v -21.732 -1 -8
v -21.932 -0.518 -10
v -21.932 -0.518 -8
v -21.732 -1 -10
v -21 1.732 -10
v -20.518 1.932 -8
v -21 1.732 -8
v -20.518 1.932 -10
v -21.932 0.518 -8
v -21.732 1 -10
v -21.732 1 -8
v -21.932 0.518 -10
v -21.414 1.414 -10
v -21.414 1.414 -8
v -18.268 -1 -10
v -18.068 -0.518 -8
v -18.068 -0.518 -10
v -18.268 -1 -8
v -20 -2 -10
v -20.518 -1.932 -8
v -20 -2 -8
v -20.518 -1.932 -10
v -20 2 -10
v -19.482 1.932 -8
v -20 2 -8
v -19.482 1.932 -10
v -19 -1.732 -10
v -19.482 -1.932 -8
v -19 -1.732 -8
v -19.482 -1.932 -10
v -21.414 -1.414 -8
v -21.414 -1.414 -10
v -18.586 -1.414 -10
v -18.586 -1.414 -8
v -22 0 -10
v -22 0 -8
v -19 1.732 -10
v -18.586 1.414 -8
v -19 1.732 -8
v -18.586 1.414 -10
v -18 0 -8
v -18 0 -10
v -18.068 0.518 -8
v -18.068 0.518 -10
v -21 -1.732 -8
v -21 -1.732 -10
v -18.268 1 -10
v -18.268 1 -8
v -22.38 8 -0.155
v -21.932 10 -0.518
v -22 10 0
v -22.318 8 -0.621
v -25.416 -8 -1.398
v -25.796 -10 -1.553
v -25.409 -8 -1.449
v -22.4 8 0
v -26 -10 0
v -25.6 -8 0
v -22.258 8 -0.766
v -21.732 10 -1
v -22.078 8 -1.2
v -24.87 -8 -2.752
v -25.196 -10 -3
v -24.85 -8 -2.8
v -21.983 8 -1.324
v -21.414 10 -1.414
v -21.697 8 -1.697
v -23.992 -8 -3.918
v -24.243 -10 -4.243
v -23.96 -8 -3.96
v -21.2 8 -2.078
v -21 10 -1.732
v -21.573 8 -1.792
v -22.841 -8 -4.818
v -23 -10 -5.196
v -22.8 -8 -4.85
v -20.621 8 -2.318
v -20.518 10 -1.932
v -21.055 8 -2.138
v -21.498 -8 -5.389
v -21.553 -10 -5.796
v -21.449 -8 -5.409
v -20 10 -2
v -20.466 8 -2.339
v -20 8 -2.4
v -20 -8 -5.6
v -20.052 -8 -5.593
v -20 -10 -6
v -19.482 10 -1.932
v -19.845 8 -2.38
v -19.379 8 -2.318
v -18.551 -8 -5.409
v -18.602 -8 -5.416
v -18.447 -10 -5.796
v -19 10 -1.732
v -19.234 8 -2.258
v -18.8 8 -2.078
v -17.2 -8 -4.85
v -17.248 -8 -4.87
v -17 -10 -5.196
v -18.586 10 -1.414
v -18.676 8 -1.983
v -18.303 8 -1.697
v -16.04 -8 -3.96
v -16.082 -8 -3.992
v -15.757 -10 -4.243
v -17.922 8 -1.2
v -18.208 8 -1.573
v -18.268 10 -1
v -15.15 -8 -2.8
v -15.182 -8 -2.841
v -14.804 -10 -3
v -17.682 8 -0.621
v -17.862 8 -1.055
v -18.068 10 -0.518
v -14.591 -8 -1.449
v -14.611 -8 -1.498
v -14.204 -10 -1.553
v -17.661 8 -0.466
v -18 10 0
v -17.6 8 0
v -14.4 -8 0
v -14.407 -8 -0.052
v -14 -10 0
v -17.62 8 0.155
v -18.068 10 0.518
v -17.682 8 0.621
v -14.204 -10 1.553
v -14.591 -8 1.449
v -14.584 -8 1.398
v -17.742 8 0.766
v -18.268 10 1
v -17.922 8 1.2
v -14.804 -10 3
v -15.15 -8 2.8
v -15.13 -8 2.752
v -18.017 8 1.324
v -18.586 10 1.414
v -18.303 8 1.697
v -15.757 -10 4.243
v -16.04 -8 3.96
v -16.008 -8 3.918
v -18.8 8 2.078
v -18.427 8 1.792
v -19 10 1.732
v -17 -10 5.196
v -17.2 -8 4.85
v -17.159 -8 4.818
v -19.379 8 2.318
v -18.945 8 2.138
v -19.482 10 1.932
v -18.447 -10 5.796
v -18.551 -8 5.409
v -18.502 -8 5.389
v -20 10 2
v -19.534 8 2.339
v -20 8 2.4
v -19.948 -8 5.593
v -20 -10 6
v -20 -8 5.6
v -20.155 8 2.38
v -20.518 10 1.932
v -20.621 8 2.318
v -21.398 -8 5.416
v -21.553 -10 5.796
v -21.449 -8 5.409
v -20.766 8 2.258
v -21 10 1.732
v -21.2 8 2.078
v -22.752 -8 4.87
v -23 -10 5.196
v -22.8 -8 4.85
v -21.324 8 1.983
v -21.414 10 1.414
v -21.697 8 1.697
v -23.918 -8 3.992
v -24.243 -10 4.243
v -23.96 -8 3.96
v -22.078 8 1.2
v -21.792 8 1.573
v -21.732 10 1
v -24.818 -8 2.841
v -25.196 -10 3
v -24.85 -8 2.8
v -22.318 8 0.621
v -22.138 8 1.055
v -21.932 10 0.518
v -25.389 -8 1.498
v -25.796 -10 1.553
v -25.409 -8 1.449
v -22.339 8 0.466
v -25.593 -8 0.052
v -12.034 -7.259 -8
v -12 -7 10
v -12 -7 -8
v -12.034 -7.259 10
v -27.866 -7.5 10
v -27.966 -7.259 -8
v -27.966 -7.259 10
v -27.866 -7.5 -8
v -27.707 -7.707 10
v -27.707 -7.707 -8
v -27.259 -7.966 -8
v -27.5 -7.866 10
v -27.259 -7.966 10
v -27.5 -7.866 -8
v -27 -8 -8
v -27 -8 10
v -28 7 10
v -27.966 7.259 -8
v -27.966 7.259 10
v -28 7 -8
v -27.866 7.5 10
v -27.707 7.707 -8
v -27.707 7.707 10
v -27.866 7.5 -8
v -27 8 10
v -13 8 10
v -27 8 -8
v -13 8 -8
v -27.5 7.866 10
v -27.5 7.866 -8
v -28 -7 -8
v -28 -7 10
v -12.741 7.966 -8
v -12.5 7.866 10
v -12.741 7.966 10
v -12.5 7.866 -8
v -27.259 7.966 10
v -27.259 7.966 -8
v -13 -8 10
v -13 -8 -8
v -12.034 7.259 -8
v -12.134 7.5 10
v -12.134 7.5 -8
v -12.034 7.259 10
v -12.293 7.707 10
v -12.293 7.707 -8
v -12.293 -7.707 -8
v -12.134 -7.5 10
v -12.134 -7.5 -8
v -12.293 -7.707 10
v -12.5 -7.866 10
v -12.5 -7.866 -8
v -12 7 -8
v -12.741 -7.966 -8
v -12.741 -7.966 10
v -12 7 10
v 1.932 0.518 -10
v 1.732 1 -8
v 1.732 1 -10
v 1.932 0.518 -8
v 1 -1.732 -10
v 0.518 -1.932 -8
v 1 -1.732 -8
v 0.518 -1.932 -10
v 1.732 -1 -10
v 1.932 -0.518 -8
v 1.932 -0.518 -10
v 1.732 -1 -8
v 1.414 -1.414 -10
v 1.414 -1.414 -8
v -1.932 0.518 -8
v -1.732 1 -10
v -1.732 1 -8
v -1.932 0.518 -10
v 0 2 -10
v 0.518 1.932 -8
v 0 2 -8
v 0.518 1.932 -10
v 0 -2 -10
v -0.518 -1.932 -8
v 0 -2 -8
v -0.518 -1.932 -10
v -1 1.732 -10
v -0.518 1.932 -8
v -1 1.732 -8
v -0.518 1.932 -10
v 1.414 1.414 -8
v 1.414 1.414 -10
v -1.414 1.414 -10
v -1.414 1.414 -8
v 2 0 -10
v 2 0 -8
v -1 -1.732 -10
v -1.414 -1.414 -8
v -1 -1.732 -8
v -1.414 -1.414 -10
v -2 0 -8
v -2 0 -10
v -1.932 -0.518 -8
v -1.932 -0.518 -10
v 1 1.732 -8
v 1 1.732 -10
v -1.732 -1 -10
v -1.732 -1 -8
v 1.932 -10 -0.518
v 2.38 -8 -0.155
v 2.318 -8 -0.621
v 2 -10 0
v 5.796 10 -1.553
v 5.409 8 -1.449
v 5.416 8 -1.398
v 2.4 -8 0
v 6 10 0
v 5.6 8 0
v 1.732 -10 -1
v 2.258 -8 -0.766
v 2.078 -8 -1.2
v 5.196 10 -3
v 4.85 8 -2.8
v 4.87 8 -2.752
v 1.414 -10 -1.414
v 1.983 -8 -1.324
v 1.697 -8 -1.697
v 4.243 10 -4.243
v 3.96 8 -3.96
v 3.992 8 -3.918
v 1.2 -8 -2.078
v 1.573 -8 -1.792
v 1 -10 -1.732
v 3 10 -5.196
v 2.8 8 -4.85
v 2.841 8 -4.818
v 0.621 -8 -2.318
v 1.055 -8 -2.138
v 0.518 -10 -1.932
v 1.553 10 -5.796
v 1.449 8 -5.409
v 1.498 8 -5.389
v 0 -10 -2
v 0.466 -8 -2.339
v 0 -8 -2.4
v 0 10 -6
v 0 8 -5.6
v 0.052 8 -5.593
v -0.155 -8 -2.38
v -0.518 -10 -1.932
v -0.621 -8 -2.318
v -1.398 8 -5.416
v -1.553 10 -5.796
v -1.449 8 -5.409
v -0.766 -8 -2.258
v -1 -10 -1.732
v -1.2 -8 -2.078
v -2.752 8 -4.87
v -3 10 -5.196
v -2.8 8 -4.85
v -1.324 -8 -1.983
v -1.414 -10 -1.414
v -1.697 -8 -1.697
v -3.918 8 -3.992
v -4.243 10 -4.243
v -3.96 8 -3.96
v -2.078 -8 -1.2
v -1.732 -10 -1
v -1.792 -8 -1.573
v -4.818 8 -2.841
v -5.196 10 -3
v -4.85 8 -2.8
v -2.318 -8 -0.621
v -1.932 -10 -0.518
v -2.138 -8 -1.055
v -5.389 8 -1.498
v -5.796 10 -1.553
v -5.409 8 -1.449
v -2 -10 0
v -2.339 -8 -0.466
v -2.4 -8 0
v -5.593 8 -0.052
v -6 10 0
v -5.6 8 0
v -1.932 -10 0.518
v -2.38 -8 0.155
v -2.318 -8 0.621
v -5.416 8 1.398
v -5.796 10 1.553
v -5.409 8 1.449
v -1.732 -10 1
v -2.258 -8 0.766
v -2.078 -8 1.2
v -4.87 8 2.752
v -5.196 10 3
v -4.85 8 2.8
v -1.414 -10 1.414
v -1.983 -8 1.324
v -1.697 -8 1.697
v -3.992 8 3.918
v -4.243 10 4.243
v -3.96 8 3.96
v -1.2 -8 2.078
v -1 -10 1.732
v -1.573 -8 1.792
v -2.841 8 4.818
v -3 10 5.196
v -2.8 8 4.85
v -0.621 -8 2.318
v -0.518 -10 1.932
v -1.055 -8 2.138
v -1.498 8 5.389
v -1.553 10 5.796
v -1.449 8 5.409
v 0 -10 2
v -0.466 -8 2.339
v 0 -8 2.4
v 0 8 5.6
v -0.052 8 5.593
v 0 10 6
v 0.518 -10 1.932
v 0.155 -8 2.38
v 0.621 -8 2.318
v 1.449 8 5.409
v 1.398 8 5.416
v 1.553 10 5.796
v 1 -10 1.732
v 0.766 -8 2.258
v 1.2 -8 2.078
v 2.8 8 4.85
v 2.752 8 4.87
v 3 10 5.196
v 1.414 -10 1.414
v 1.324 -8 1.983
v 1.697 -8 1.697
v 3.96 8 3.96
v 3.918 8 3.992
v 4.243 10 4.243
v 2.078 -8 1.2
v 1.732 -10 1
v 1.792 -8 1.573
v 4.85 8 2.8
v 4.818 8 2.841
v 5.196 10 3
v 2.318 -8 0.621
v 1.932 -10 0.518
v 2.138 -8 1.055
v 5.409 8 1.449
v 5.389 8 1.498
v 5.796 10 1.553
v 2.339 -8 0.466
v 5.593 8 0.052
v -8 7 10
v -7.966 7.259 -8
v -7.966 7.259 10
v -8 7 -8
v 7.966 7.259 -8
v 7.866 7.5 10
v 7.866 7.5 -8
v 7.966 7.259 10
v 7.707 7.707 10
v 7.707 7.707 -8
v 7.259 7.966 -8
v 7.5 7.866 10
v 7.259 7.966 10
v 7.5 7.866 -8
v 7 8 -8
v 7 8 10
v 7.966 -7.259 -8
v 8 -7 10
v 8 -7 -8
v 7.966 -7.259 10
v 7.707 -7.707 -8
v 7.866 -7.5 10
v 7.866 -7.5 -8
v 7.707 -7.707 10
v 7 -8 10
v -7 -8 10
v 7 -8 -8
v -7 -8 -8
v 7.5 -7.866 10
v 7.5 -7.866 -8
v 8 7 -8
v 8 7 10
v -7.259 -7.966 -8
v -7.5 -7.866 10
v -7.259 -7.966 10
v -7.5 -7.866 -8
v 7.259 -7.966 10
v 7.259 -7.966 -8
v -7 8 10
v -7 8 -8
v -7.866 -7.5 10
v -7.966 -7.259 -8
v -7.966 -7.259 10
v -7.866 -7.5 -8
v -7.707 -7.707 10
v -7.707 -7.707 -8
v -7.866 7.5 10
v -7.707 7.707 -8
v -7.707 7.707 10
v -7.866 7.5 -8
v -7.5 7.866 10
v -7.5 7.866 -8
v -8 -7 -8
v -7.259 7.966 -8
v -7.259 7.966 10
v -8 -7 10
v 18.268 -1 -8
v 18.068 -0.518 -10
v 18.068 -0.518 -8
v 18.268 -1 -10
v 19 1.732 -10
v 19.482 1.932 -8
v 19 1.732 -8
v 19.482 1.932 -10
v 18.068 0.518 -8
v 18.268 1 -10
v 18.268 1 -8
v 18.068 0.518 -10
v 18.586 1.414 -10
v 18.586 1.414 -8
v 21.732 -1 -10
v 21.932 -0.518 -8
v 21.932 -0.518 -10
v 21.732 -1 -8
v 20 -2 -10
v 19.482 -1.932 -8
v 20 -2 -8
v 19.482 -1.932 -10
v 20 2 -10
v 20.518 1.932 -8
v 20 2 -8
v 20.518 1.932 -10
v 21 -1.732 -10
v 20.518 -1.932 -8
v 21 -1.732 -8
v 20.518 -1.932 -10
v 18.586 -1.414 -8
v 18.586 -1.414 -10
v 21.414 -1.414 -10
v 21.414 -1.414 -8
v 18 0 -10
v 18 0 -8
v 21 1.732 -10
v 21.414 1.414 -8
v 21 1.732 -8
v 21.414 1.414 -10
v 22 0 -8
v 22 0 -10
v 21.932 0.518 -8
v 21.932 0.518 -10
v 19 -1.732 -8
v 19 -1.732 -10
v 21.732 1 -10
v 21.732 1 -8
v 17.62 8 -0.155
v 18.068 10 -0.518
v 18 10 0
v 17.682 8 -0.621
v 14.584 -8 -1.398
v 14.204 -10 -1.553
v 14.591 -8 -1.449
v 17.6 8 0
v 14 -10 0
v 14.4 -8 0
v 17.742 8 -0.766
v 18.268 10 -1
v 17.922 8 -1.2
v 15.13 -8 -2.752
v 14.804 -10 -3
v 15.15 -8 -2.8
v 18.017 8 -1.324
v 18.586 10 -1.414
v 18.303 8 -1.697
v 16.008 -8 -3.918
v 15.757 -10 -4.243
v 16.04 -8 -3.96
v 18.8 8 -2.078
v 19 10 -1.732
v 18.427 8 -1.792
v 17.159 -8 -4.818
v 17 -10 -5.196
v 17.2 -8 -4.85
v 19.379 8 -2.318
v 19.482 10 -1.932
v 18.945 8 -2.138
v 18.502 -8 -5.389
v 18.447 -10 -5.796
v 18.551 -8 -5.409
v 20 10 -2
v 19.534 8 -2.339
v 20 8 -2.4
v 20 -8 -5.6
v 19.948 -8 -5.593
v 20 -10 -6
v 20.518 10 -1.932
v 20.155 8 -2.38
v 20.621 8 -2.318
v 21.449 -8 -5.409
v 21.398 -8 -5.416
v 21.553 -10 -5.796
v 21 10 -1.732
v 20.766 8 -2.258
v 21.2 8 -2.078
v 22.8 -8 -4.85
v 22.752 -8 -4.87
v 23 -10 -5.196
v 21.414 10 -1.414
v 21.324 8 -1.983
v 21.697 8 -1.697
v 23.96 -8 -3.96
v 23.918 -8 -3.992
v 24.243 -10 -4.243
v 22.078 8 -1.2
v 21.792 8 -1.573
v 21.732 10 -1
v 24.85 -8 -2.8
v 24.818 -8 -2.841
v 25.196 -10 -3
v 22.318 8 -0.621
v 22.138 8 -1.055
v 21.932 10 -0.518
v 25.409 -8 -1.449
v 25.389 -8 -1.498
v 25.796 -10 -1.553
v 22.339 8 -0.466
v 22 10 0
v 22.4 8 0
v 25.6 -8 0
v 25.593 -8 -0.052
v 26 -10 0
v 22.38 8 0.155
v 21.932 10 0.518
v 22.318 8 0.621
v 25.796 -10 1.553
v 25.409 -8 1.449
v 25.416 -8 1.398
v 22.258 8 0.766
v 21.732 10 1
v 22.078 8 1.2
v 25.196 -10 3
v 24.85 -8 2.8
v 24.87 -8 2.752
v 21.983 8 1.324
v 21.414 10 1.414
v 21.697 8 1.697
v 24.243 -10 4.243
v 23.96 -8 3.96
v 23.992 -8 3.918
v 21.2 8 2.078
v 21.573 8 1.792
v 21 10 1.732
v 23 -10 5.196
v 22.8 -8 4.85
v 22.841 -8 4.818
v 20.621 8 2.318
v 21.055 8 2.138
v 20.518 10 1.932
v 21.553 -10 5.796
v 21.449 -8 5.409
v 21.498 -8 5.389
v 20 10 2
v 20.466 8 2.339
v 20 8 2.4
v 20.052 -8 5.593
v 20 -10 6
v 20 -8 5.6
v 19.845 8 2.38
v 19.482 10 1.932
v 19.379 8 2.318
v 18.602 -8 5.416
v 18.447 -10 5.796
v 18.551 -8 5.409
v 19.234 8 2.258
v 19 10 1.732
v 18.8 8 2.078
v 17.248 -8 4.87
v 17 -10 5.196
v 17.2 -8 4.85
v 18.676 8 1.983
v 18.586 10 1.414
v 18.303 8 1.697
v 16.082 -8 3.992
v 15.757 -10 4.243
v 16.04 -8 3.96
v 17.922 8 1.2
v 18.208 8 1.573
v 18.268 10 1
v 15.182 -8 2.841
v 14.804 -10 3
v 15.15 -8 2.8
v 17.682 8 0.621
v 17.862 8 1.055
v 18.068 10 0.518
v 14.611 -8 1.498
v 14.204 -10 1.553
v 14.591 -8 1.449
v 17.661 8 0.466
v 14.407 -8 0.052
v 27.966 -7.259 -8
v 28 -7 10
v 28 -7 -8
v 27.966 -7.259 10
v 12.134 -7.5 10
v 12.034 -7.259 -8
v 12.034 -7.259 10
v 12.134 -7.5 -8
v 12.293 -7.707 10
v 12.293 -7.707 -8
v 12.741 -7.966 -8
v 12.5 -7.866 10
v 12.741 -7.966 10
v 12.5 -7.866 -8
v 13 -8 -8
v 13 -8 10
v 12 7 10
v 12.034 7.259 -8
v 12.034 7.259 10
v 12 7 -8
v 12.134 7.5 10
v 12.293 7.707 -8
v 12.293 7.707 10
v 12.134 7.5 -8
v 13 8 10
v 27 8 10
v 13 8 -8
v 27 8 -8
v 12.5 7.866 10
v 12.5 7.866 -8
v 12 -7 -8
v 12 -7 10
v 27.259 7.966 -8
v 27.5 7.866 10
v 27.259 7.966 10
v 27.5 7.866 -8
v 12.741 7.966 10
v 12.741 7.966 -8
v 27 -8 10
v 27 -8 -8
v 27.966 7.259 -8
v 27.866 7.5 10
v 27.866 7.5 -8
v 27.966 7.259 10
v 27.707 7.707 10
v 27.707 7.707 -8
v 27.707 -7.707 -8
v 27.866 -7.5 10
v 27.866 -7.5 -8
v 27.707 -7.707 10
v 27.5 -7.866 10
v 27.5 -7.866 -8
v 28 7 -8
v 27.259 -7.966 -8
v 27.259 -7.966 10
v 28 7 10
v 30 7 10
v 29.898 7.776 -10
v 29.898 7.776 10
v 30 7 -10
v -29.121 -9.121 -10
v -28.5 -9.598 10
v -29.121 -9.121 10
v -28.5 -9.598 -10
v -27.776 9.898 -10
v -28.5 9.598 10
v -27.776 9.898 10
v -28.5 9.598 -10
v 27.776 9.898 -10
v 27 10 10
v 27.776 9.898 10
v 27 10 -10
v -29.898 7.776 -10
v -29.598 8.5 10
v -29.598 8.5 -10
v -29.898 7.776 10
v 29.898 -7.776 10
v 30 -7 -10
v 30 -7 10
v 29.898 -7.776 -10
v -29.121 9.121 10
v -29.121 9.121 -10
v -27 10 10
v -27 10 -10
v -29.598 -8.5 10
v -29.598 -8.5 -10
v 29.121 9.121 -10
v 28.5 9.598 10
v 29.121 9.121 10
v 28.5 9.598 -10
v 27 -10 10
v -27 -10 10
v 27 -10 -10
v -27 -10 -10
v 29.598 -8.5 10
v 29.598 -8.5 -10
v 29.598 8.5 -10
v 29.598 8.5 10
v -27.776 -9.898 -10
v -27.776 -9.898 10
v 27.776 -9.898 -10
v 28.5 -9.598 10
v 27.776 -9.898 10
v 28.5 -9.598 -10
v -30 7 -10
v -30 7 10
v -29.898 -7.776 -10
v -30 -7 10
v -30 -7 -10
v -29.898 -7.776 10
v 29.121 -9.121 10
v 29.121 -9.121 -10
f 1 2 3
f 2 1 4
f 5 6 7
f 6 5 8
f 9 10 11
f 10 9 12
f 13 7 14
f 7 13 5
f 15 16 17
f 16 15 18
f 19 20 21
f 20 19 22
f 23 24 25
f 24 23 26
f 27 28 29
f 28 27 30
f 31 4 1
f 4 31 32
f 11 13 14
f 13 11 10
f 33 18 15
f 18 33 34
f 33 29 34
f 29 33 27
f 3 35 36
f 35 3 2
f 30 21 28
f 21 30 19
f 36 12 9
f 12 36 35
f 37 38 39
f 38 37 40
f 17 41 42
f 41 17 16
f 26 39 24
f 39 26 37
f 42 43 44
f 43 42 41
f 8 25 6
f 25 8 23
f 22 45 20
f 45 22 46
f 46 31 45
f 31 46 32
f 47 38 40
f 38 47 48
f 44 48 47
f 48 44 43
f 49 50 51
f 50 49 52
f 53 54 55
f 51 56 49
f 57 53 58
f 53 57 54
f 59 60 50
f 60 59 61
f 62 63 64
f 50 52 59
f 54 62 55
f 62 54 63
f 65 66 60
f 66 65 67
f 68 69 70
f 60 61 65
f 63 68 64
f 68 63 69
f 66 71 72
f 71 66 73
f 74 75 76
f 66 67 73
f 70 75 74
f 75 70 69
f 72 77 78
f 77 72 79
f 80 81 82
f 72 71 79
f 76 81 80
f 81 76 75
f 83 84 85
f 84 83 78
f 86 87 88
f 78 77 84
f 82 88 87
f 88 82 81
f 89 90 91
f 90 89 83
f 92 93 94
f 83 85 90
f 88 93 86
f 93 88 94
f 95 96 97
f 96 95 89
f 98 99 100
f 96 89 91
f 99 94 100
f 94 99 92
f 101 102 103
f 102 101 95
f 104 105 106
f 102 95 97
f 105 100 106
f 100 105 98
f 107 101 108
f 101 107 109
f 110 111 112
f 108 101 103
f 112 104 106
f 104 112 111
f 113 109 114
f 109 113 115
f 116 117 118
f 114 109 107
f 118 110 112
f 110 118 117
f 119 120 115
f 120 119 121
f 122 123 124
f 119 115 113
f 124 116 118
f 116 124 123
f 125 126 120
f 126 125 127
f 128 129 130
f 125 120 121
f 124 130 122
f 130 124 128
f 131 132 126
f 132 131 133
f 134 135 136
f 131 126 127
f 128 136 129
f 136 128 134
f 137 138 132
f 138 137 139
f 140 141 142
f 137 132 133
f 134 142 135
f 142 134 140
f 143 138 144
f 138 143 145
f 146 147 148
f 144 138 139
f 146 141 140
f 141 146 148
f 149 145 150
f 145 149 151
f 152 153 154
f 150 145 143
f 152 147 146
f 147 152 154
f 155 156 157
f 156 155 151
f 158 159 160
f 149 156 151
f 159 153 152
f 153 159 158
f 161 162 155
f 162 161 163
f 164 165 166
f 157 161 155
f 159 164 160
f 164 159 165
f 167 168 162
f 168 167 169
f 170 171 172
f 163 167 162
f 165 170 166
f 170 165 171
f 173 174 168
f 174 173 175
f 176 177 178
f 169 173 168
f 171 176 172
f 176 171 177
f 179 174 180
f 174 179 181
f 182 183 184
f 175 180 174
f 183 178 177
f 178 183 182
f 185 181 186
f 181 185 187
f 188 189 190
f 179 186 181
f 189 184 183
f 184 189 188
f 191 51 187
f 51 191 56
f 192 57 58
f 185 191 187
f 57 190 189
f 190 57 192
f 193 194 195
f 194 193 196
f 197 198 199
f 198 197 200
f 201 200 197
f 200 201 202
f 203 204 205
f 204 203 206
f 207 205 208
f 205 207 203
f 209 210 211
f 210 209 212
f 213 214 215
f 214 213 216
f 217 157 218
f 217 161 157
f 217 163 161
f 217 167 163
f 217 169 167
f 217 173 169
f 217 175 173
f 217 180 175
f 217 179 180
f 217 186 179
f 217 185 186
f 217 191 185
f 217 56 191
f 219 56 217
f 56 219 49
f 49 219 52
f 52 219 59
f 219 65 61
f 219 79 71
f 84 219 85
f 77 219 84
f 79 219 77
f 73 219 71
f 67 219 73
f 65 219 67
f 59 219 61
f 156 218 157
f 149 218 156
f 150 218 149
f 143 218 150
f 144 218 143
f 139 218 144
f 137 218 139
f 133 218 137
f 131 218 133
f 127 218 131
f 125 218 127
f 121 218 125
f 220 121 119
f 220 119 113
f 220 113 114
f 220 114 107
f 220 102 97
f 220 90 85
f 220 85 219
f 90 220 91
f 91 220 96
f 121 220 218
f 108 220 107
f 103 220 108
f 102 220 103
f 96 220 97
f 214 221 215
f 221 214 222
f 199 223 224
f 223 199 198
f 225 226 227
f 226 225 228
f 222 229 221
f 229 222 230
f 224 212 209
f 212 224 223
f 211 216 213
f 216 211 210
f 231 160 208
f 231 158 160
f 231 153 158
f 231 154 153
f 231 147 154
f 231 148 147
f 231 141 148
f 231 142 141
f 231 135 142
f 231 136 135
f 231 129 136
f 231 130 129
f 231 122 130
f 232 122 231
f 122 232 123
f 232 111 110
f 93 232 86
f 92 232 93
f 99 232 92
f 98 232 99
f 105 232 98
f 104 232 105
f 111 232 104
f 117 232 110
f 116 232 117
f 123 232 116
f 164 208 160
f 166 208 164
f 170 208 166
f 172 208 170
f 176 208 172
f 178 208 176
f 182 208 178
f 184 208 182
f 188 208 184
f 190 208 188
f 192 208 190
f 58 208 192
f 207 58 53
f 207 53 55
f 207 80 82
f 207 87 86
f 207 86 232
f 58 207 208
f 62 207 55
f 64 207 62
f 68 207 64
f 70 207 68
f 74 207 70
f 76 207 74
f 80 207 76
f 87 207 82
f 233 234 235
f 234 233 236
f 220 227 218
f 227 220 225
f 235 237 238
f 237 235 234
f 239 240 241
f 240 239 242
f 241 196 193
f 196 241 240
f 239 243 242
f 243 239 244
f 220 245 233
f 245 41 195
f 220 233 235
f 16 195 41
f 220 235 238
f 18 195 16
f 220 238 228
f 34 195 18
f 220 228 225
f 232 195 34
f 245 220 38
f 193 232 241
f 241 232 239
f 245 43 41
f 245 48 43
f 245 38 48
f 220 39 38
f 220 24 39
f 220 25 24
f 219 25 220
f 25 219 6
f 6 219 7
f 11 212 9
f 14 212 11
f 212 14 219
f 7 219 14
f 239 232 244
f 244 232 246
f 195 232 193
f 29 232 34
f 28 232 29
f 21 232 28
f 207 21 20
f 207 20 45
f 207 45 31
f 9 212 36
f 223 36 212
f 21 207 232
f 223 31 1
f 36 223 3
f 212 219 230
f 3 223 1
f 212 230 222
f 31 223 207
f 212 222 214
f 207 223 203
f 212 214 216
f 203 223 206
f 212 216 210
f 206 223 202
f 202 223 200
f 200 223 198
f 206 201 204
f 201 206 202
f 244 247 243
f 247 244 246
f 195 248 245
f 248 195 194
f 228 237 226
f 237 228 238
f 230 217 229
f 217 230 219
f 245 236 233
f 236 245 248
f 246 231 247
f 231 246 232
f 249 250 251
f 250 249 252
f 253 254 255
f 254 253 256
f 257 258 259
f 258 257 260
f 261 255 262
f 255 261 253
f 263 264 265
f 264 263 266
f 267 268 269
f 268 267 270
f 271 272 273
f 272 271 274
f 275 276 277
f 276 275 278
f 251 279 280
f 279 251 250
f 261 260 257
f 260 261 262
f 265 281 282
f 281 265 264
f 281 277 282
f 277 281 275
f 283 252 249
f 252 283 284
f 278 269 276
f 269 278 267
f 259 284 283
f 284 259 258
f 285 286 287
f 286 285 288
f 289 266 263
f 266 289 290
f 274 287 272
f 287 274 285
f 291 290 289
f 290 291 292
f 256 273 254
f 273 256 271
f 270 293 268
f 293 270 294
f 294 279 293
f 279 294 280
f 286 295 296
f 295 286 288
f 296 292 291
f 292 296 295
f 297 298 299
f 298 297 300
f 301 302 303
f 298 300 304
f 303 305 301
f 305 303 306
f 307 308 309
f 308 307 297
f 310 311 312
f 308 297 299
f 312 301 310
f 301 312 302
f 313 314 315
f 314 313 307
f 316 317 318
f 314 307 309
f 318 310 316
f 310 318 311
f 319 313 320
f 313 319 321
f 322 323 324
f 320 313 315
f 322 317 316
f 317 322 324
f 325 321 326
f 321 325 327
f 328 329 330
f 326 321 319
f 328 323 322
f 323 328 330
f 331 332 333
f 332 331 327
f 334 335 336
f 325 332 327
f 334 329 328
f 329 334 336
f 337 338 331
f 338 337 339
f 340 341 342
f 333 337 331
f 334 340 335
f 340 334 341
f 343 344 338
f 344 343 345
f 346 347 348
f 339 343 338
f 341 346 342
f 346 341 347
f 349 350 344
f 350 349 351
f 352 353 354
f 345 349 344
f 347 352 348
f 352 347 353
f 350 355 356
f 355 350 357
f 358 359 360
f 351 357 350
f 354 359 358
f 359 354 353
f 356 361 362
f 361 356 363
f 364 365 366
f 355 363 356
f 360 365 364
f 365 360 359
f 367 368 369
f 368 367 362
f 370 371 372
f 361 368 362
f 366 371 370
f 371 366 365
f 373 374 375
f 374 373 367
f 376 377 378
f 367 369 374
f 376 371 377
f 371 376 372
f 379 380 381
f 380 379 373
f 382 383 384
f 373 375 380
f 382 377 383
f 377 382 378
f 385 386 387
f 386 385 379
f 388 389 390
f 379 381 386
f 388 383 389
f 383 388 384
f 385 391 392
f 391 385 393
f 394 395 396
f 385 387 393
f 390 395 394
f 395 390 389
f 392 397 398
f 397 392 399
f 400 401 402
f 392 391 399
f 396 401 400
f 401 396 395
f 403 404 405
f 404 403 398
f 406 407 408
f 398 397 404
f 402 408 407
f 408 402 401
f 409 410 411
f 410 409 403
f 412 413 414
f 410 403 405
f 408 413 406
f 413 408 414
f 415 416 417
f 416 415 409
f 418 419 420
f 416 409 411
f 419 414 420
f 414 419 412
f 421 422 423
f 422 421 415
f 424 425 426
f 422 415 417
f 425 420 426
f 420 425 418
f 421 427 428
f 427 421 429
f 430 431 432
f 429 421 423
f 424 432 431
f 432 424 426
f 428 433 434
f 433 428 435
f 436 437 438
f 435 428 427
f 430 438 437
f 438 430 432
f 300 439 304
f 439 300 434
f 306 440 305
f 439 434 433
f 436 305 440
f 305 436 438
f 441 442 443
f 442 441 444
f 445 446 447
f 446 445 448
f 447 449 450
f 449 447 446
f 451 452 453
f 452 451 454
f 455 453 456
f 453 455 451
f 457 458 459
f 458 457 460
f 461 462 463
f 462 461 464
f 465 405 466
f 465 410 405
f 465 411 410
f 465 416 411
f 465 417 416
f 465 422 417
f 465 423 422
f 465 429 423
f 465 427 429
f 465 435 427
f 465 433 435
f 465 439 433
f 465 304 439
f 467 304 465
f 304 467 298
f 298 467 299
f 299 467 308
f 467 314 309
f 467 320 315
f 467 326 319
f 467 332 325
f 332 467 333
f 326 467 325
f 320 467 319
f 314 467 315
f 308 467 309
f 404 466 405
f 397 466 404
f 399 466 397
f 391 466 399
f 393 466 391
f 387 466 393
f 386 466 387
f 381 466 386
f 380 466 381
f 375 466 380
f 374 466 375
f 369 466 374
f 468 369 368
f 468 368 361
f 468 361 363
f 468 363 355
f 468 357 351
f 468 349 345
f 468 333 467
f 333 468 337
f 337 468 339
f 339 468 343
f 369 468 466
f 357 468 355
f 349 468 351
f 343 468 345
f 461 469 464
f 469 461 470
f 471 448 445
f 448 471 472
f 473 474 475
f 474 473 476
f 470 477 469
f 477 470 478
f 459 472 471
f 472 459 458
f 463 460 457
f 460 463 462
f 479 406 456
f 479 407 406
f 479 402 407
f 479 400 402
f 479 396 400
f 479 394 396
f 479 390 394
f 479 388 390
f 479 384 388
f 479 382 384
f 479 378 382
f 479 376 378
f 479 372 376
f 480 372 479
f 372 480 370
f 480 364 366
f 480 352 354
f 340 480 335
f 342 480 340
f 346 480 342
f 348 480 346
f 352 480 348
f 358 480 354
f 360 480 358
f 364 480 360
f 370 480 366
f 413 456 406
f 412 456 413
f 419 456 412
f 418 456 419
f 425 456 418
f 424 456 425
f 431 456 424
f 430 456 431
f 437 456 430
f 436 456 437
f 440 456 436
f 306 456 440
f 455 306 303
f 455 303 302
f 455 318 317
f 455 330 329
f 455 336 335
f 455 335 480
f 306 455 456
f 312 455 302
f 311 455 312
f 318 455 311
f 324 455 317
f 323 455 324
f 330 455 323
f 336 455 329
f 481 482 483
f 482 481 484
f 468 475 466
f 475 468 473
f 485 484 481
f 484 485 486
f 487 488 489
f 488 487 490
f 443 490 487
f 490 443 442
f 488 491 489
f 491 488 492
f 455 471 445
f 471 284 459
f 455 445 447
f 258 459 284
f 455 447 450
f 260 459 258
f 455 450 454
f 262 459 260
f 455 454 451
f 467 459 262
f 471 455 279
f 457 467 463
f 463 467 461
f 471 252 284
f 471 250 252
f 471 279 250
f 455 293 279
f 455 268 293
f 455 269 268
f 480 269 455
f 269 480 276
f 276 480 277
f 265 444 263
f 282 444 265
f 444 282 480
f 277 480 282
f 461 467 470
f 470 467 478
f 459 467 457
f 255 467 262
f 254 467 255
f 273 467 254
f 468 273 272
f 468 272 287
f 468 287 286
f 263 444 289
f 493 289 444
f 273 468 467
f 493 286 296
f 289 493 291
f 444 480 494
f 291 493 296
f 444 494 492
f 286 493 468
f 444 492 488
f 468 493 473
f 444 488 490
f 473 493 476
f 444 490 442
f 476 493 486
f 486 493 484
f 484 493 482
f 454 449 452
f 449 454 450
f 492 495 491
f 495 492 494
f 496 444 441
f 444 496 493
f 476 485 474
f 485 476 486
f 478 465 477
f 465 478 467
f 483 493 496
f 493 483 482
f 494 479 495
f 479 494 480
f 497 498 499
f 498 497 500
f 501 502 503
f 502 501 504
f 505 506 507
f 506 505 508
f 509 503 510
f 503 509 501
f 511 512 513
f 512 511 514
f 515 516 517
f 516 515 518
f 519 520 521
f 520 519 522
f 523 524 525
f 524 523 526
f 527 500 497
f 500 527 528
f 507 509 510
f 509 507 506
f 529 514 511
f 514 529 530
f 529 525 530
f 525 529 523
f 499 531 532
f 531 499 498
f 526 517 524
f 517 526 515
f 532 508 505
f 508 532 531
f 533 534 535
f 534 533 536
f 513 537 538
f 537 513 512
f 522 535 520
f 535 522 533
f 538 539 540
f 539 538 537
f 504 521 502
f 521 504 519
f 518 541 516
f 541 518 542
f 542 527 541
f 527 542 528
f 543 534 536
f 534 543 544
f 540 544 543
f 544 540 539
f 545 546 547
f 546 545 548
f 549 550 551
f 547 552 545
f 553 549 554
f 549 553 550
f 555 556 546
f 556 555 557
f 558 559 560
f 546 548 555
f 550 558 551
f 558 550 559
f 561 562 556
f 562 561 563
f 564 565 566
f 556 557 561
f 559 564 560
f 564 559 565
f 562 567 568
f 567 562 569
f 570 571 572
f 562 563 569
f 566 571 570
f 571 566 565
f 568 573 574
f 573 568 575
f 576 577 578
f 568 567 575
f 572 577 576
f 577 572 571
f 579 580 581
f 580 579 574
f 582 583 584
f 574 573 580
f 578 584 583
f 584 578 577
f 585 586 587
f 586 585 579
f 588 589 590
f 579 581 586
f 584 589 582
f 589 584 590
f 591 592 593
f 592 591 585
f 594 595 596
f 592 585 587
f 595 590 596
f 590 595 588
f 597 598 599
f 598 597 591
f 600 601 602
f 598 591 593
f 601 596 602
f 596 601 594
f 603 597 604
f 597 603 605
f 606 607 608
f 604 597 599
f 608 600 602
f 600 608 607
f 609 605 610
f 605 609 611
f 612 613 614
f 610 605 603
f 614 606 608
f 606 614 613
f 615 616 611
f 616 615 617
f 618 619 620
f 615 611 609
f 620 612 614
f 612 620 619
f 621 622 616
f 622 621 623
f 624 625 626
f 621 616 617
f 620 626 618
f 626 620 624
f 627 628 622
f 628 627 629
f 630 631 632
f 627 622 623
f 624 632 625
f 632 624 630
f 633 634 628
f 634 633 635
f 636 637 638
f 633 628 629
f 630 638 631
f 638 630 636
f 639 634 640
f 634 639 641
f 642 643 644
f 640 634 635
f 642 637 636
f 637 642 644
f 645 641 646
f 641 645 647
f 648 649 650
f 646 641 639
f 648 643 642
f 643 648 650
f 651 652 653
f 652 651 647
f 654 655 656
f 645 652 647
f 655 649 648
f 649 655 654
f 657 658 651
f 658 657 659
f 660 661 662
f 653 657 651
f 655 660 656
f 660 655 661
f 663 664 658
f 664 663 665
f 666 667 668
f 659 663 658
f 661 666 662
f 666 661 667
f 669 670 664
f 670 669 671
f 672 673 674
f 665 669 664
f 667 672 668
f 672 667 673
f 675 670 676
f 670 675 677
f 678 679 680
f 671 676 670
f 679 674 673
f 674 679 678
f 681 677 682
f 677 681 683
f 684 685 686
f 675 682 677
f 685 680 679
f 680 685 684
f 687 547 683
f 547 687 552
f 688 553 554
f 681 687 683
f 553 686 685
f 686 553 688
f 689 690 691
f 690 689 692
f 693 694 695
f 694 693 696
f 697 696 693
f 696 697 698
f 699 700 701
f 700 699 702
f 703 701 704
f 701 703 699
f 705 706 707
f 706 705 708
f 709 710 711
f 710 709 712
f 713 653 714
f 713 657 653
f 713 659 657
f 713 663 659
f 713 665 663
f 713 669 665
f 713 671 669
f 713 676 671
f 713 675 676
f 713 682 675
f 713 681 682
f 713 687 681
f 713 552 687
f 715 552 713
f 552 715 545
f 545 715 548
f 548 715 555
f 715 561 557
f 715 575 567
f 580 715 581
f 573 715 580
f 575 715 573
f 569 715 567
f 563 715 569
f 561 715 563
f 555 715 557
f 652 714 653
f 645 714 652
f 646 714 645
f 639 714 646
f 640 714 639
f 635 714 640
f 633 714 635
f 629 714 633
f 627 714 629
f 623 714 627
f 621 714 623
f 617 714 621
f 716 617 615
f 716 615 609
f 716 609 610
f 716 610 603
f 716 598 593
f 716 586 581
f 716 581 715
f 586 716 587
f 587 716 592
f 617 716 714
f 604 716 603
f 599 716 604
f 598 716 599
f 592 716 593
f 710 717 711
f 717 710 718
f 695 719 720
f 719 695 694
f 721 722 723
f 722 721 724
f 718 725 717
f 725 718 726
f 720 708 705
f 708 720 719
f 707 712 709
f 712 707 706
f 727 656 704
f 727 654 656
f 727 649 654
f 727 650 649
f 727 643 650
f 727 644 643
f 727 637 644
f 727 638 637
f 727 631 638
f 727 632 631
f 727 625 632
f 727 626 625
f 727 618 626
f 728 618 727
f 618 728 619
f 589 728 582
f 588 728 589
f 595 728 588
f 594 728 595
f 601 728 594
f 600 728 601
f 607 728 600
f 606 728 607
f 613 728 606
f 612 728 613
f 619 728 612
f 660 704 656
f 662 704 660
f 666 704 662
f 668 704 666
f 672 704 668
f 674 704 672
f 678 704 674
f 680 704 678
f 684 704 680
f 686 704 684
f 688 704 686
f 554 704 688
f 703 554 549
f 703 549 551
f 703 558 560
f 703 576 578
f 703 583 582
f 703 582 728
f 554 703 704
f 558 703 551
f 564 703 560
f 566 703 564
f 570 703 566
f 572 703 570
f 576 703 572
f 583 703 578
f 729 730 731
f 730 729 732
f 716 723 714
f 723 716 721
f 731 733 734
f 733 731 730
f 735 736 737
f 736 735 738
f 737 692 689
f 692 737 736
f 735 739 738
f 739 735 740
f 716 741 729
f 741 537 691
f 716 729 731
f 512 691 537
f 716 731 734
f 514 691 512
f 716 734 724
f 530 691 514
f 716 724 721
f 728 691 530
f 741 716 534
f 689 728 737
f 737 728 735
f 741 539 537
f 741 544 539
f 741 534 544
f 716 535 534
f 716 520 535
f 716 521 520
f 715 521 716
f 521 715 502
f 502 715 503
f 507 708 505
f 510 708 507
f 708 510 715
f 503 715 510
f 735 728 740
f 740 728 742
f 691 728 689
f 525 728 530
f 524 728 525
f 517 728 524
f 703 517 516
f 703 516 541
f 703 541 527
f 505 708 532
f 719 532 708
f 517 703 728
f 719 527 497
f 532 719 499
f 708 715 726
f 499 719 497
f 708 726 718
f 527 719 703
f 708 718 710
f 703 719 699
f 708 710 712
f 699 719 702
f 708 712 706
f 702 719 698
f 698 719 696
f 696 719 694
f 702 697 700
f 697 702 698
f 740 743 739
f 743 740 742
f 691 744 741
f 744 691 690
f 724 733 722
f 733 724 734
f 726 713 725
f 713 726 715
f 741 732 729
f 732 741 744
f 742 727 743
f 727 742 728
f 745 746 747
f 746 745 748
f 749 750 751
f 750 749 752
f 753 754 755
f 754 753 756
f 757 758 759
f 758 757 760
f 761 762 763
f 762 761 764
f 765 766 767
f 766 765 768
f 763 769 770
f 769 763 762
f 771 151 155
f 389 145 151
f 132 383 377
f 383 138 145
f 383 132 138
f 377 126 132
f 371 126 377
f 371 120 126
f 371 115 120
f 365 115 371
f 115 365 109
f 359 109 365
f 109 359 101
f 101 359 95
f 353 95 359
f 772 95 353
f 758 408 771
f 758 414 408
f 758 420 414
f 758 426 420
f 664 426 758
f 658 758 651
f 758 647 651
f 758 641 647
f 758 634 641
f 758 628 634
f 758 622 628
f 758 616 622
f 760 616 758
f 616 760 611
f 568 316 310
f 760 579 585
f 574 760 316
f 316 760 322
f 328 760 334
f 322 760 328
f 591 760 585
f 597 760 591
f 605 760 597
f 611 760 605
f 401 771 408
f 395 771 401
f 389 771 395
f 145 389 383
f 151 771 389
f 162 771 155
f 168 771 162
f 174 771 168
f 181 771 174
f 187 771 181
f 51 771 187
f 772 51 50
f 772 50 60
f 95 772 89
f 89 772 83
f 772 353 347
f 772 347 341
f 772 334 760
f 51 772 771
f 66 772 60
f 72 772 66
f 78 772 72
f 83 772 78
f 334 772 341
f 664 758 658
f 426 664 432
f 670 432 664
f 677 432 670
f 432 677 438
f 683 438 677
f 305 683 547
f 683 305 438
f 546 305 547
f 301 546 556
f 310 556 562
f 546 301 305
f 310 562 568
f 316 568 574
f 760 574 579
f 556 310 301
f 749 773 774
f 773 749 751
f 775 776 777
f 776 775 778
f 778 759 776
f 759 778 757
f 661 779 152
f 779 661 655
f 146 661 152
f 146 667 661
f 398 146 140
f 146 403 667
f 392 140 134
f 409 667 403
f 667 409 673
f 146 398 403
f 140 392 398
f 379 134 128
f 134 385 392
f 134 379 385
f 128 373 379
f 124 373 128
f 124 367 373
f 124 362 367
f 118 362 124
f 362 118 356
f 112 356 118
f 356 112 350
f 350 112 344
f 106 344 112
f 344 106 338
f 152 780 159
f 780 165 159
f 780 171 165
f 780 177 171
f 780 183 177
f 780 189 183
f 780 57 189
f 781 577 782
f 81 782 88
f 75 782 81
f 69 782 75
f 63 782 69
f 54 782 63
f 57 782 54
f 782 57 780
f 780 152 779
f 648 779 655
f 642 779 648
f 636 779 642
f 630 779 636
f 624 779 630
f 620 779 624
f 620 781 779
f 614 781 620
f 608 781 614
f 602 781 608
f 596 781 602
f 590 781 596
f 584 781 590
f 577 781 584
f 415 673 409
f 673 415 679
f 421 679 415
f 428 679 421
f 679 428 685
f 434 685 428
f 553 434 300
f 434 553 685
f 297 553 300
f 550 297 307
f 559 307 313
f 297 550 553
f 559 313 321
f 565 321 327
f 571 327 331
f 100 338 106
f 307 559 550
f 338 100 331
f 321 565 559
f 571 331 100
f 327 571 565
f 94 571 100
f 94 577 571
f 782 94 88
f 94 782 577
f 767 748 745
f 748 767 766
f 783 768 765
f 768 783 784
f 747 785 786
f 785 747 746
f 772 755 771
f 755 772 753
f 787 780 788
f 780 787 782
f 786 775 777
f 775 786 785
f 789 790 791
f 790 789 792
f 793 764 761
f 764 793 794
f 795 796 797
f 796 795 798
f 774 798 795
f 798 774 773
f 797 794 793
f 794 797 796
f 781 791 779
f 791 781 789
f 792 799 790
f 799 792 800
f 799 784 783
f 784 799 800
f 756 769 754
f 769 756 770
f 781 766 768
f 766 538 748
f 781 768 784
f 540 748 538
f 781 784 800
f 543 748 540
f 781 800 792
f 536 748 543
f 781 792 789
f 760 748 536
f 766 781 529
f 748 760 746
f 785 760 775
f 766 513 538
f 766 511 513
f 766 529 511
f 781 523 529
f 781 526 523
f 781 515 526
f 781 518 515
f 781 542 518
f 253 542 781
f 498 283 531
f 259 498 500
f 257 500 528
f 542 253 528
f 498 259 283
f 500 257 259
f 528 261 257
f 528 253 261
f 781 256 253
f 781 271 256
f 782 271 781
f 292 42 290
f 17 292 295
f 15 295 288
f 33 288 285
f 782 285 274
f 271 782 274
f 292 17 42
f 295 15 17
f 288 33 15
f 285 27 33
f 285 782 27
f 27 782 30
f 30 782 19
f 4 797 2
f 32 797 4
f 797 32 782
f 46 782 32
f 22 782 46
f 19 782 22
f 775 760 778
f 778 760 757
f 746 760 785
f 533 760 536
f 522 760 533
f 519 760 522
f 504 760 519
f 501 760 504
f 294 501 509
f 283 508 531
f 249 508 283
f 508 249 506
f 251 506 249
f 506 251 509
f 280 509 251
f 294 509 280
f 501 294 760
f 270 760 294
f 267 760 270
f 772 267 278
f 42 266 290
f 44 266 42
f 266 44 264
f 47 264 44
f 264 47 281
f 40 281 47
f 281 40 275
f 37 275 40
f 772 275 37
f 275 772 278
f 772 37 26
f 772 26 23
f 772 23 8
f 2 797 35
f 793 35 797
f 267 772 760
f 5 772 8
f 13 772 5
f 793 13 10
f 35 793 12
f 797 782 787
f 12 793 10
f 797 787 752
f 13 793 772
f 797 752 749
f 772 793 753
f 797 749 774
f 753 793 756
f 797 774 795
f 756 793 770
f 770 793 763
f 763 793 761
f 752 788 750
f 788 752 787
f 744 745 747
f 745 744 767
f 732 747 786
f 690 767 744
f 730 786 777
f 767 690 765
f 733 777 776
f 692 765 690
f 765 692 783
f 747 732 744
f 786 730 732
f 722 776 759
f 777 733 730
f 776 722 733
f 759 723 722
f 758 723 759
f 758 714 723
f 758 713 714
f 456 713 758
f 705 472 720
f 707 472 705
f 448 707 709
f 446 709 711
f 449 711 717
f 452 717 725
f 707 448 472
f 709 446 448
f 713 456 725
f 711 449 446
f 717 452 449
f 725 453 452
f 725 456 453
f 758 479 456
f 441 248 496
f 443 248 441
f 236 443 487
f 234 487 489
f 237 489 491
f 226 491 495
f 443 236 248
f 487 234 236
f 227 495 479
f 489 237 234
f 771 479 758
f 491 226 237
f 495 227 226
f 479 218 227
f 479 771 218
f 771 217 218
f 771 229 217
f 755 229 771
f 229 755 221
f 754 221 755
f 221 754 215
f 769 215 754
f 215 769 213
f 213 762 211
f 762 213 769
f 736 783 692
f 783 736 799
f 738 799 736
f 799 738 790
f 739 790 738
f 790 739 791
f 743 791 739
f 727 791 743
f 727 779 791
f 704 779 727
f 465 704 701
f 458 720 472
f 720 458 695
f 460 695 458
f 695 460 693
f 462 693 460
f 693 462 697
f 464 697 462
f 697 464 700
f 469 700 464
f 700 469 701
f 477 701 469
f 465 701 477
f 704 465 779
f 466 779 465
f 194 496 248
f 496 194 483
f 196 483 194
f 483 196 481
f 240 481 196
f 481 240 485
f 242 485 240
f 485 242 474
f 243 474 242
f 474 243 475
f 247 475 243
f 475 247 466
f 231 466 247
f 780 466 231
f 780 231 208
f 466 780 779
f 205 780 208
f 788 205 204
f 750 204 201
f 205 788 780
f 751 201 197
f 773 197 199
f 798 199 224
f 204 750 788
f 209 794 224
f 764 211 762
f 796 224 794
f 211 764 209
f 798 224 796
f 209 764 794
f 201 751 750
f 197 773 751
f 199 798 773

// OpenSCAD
// file: ../lib/TOGMod1Constructors.scad
// TOGMod1Constructors-v1.6
// 
// Functions to construct objects understood by TOGMod1
// 
// v1.1:
// - Add togmod1_make_rounded_rect
// v1.2:
// - togmod1_make_rounded_rect can make ovals
// v1.3:
// - togmod1_circle_points, to just get the points of a circle
// - if pos parameter to circle function has a third element,
//   returned vertexes will include it as the z component;
// v1.3.1
// - Some assertions
// v1.4:
// - Refactor togmod1_rounded_rect_points and togmod1_circle_points
//   to use togmod1__make_nd_vector_adder for adapting to whatever
//   `pos` parameter is.
// v1.5:
// - togmod_rounded_rect_points will not simplify completely rounded sides
//   (where length of side is exactly twice the rounding radius)
//   unless simplify_rounded_sides=true
//   - This makes it more useful for polyhedron generation,
//     where radius varies, but number of points must remain constant.
// v1.6:
// - togmod1_make_rect makes a simple rectangle
// - togmod1_make_rounded_rect will defer to togmod1_make_rect when r=0

use <./TOGArrayLib1.scad>

function togmod1__make_nd_vector_adder(origin=[0,0]) =
	let(origin_is_zero = tal1_reduce(true, origin, function(prev,item) prev && item == 0))
	origin_is_zero ? (function(vec) len(vec) >= len(origin) ? vec : tal1_replace_at(origin, 0, vec)) :
	function(vec) [
		for(i=[0:1:max(len(origin),len(vec))-1]) (len(vec) > i ? vec[i] : 0) + (len(origin) > i ? origin[i] : 0),
	];

assert([1,2,3] == togmod1__make_nd_vector_adder()([1,2,3]));
echo(togmod1__make_nd_vector_adder([0,0,3])([1,2]));
assert([1,2,3] == togmod1__make_nd_vector_adder([0,0,3])([1,2]));


function togmod1_make_cuboid(size) =
	assert(is_list(size))
	assert(len(size) >= 3)
	assert(is_num(size[0]))
	assert(is_num(size[1]))
	assert(is_num(size[2]))
	["polyhedron-vf", [
		[-size[0]/2, -size[1]/2, -size[2]/2],
		[+size[0]/2, -size[1]/2, -size[2]/2],
		[-size[0]/2, +size[1]/2, -size[2]/2],
		[+size[0]/2, +size[1]/2, -size[2]/2],
		[-size[0]/2, -size[1]/2, +size[2]/2],
		[+size[0]/2, -size[1]/2, +size[2]/2],
		[-size[0]/2, +size[1]/2, +size[2]/2],
		[+size[0]/2, +size[1]/2, +size[2]/2]
	], [
		[0,1,3,2],[0,4,5,1],[4,6,7,5],[3,7,6,2],[1,5,7,3],[6,4,0,2]
	]];

function togmod1_make_polygon(verts) =
	["polygon-vp", verts, [[for( i=[0:1:len(verts)-1] ) i%len(verts)]]];

function togmod1_rounded_rect_points(size, r, pos=[0,0], simplify_rounded_sides=false) =
	assert(is_list(size))
	assert(len(size) >= 2)
	let(radii = is_list(r) ? r : is_num(r) ? [r,r] : assert(false, "rounded_rect r(adius) should be list<num> or num"))
	let(rx = radii[0])
	let(ry = radii[1])
	assert(is_num(rx))
	assert(is_num(ry))
	assert(size[0] >= 2*rx, str("size[0] must be >= 2*r[0]; size[0] = ",size[0],", 2*r[0] = ",2*rx))
	assert(size[1] >= 2*ry, str("size[1] must be >= 2*r[1]; size[1] = ",size[1],", 2*r[1] = ",2*ry))
	let(quarterfn=max($fn/4, 1))
	let(qfnx = simplify_rounded_sides && size[0] == 2*rx ? quarterfn-1 : quarterfn)
	let(qfny = simplify_rounded_sides && size[1] == 2*ry ? quarterfn-1 : quarterfn)
	let(finalizepos = togmod1__make_nd_vector_adder(pos))
[
	for(a=[0 : 1 : qfnx]) let(ang=      a*90/quarterfn) finalizepos([ size[0]/2-rx + rx*cos(ang),  size[1]/2-ry + ry*sin(ang)]),
	for(a=[0 : 1 : qfny]) let(ang= 90 + a*90/quarterfn) finalizepos([-size[0]/2+rx + rx*cos(ang),  size[1]/2-ry + ry*sin(ang)]),
	for(a=[0 : 1 : qfnx]) let(ang=180 + a*90/quarterfn) finalizepos([-size[0]/2+rx + rx*cos(ang), -size[1]/2+ry + ry*sin(ang)]),
	for(a=[0 : 1 : qfny]) let(ang=270 + a*90/quarterfn) finalizepos([ size[0]/2-rx + rx*cos(ang), -size[1]/2+ry + ry*sin(ang)]),
];

function togmod1_make_rect(size) =
	togmod1_make_polygon([
		[-size[0]/2, -size[1]/2],
		[+size[0]/2, -size[1]/2],
		[+size[0]/2, +size[1]/2],
		[-size[0]/2, +size[1]/2],
	]);

function togmod1_make_rounded_rect(size, r) =
	r == 0 ? togmod1_make_rect(size) :
	togmod1_make_polygon(togmod1_rounded_rect_points(size,r,simplify_rounded_sides=true));

function togmod1_circle_points(r, pos=[0,0], d=undef) =
	assert( !is_undef(r) || !is_undef(d) )
	assert(!is_undef(pos[0]))
	assert(!is_undef(pos[1]))
	let(finalizepos = togmod1__make_nd_vector_adder(pos))
	let(r_ = !is_undef(r) ? r : d/2)
	let(fn = max($fn, 6))
	[for(i=[0 : 1 : fn-1]) finalizepos([r_*cos(i*360/fn), r_*sin(i*360/fn)])];

function togmod1_make_circle(r, pos=[0,0], d=undef) =
	togmod1_make_polygon(togmod1_circle_points(r=r, pos=pos, d=d));

function togmod1_make_cylinder(d, zrange=[0,1], r=undef, pos=[0,0]) =
	assert( !is_undef(r) || !is_undef(d) )
	let( r_ = !is_undef(r) ? r : d/2 )
	// TODO: Make polyhedron directly
	["linear-extrude-zs", zrange, togmod1_make_circle(r=r_, pos=pos)];

function togmod1__is_range1d(range) = is_list(range) && len(range) == 2 && is_num(range[0]) && is_num(range[1]);

function togmod1_linear_extrude_z(range, shape) =
	assert(togmod1__is_range1d(range))
	["linear-extrude-zs", range, shape];
function togmod1_linear_extrude_x(range, shape) =
	assert(togmod1__is_range1d(range))
	["rotate", [90, 0, 90], togmod1_linear_extrude_z(range, shape)];
function togmod1_linear_extrude_y(range, shape) =
	assert(togmod1__is_range1d(range))
	["rotate", [90, 0, 180], togmod1_linear_extrude_z(range, shape)];
// file: ../lib/TOGArrayLib1.scad
// TOGArrayLib1.4
// 
// Functions for working with arrays.
// 
// v1.1:
// - tal1_reduce assert(is_list(items)) to prevent infinite recursion
//   when given undefined or other non-list values
// v1.1.1:
// - Fix tal1_uniq_remap_v2 to return "list-remap-result" as the
//   first element of the returned list
// v1.2:
// - Add tal1_replace_at function
// v1.3:
// - tal1_is_vec_of, tal1_is_vec_of_num
// v1.4:
// - tal1_assert_for_each, for when you want to assert something
//   about each of a list of items and get nice failure messages

/**
 * Make a list with the contents of list `a`,
 * but starting at offset `off`, replaced by the contents of list `b`.
 * len(result) = max(len(a), off+len(b))
 */
function tal1_replace_at(a, off, b, default_value=undef, default_value_function=undef) =
	assert(is_list(a))
	assert(is_list(b))
	let( _dvf = !is_undef(default_value_function) ? default_value_function : function(i) default_value )
[
	for( i=[0:1:min(off,len(a))-1] ) a[i],
	for( i=[len(a):1:off-1] ) _dvf(i),
	for( i=[off:1:off+len(b)-1] ) b[i-off],
	for( i=[off+len(b):1:len(a)-1] ) a[i],
];

// Simplest case
assert([] == tal1_replace_at([], 0, []));
// Second simplest cases
assert(["foo"] == tal1_replace_at(["foo"], 0, []));
assert(["foo"] == tal1_replace_at([], 0, ["foo"]));
// Replace one item
assert(["foo","quux","baz"] == tal1_replace_at(["foo","bar","baz"], 1, ["quux"]));
// Replace and extend
assert(["foo","quux","tuna","tina"] == tal1_replace_at(["foo","bar","baz"], 1, ["quux", "tuna", "tina"]));
// Add beyond end of `a`
assert(["foo","zzz","quux"] == tal1_replace_at(["foo"], 2, ["quux"], default_value="zzz"));
// Adding 'nothing' should still fill to that point with defaults
assert(["foo","zzz","zzz"] == tal1_replace_at(["foo"], 3, [], default_value="zzz"));


function tal1_reduce(start, items, func, offset=0) =
	assert(is_list(items))
	len(items) == offset ? start :
	tal1_reduce(func(start, items[offset]), items, func, offset+1);

function tal1_consecutive_duplicate_count(items) = tal1_reduce(
	[0, undef],
	items,
	function(z,item) [z[0] + (item == z[1] ? 1 : 0), item]
)[0];

assert(0 == tal1_consecutive_duplicate_count([]));
assert(0 == tal1_consecutive_duplicate_count([50]));
assert(1 == tal1_consecutive_duplicate_count([50,50]));
assert(0 == tal1_consecutive_duplicate_count([50,51,52,53]));
assert(1 == tal1_consecutive_duplicate_count([50,51,52,52]));
assert(3 == tal1_consecutive_duplicate_count([50,50,50,50]));

// Set test_size to arbirarily large values
// to ensure that OpenSCAD can handle heavy recursion
let(test_size=1000) assert(test_size/2 == tal1_consecutive_duplicate_count([for(i=[0:1:test_size-1]) floor(i/2)]));



function tal1_uniq_(items, off0, off1) =
	let(chunklen = off1-off0)
	chunklen == 0 ? [] :
	chunklen == 1 ? [items[off0]] :
	let(half=floor(chunklen/2))
	let(left  = tal1_uniq_(items, off0     , off0+half))
	let(right = tal1_uniq_(items, off0+half, off1     ))
	assert(len(left) > 0)
	assert(len(right) > 0)
	left[len(left)-1] == right[0] ? [each left, for(i=[1:1:len(right)-1]) right[i]] :
	[each left, each right];

/** Given a list of items, returns a new list with identical consecutive items merged */
function tal1_uniq(items) = tal1_uniq_(items, 0, len(items));

assert([] == tal1_uniq([]));
assert([123] == tal1_uniq([123]));
assert([55,0,1,2,3] == tal1_uniq([55,0,1,2,3]));
assert([55,0,1,2] == tal1_uniq([55,0,1,1,2]));
assert([55,0,1] == tal1_uniq([55,55,0,0,0,0,0,0,1,1,1,1]));
assert([55,0] == tal1_uniq([55,0,0,0,0,0,0,0]));



/**
 * Returns [new items, old index -> new index mapping].
 * No-op version.
 */
function tal1_uniq_remap_v1(items) =
	["list-remap-result", items, [for (vi=[0:1:len(items)-1]) vi]];

// [a, a, b, b, c, c]
//
// [a,    ...], []  -> [a],[0]
// [a, a, ...], [0] -> [a],[0,0]

assert([1,2,3] == [1,2,3]);

/**
 * Recursive version that will combine adjacent identical vertexes,
 * but will use the original items.
 */
function tal1_uniq_remap_v2(items, map=[]) =
	let(index = len(map))
	len(items) == index ? ["list-remap-result", items, map] :
	index == 0 ? tal1_uniq_remap_v2(items, [0]) :
	items[index] == items[map[index-1]] ? tal1_uniq_remap_v2(items, [for(vi=map) vi, map[index-1]]) :
	tal1_uniq_remap_v2(items, [for(vi=map) vi, index]);

assert(tal1_uniq_remap_v2([1,1,2,2,3,4]) == ["list-remap-result", [1,1,2,2,3,4], [0,0,2,2,4,5]]);


/**
 * Returns true if `vec` is a list of at least min_len items
 * and component_check(each item, even those beyond min_len) is true.
 */
function tal1_is_vec_of(vec, min_len=0, component_check=function(x) true) =
	assert(is_num(min_len) && min_len >= 0)
	assert(is_function(component_check))
	is_list(vec) && len(vec) >= min_len &&
	tal1_reduce(true, vec, function(prev,item) prev && component_check(item));

function tal1_is_vec_of_num(vec, min_len=0) = tal1_is_vec_of(vec, min_len, function(i) is_num(i));

assert( true == tal1_is_vec_of_num([1,2,3]));
assert( true == tal1_is_vec_of_num([]));
assert( true == tal1_is_vec_of_num([1,2,3], 3));
assert(false == tal1_is_vec_of_num([1,2], 3));
assert(false == tal1_is_vec_of_num([1,2,"spoon"], 3));
// Requirements are ambiguous when
// first min_len items are numbers, but there are non-numeric items afterwards,
// so let's error on the side of saying 'no, it's not a list of numbers';
// i.e. the item check and the min_len are independent.
assert(false == tal1_is_vec_of_num([1,2,3,"artichoke"], 3));


/**
 * Asserts that item_checker(each item in list, index of item)[0] is true.
 * Second element of item_checker return value is assertion message.
 * Returns the original list, in case that's useful to you.
 */
function tal1_assert_for_each(list, item_checker) =
	let( _ignored = [ for(i=[0:1:len(list)-1])
		let(q=item_checker(list[i],i))
		let(passed=is_bool(q) ? q : is_list(q) ? q[0] : assert(false, str(
			"tal1_assert_for_each: item_checker should return Bool|[Bool,String], but returned ",
			q, " for item at index ", i)))
		let(message=is_list(q) ? q[1] : undef)
		assert(passed, message)
		q
	])
	list;

// Callback can return a boolean...
assert([1,2,3] == tal1_assert_for_each([1,2,3], function(v,i) is_num(v)));
// ...or a [boolean, string]
assert([1,2,3] == tal1_assert_for_each([1,2,3], function(v,i) [is_num(v), "element be a num"]));
// file: ../lib/TOGMod1.scad
// TOGMod1
// OpenSCAD library for representing shapes
// 
// See also: Functional OpenSCAD (https://github.com/thehans/FunctionalOpenSCAD)

module togmod1_domodule(mod) {
	assert(is_list(mod));
	assert(len(mod) > 0);
	if( mod[0] == "polygon-vp" ) {
		// ["polygon-vp", vertexes, paths]
		polygon(points=mod[1], paths=mod[2]);
	} else if( mod[0] == "polyhedron-vf" ) {
		polyhedron(mod[1], faces=mod[2]);
	} else if( mod[0] == "scale" ) {
		assert(len(mod) == 3);
		scale(mod[1]) togmod1_domodule(mod[2]);
	} else if( mod[0] == "translate" ) {
		assert(len(mod) == 3);
		assert(is_list(mod[1]));
		for(c=mod[1]) assert(is_num(c), "translate component should be numeric");
		translate(mod[1]) togmod1_domodule(mod[2]);
	} else if( mod[0] == "rotate" ) {
		assert(len(mod) == 3);
		rotate(mod[1]) togmod1_domodule(mod[2]);
	} else if( mod[0] == "intersection" ) {
		intersection_for( i=[1:1:len(mod)-1] ) togmod1_domodule(mod[i]);
	} else if( mod[0] == "difference" ) {
		difference() {
			togmod1_domodule(mod[1]);
			for( i=[2:1:len(mod)-1] ) togmod1_domodule(mod[i]);
		}
	} else if( mod[0] == "union" ) {
		for( i=[1:1:len(mod)-1] ) togmod1_domodule(mod[i]);
	} else if( mod[0] == "hull" ) {
		hull() for( i=[1:1:len(mod)-1] ) togmod1_domodule(mod[i]);
	} else if( mod[0] == "offset-rs" ) {
		assert(len(mod) == 3);
		assert(is_num(mod[1]));
		assert(is_list(mod[2]));
		offset(mod[1]) togmod1_domodule(mod[2]);
	} else if( mod[0] == "linear-extrude-zs" ) {
		// ["linear-extrude-zs", [z0,z1], 2d_shape] // centered
		// ["linear-extrude-zs", height, 2d_shape]
		let( zrange = is_list(mod[1]) ? mod[1] : [-mod[1]/2, mod[1]/2] ) {
			translate([0,0,zrange[0]]) linear_extrude(zrange[1]-zrange[0]) togmod1_domodule(mod[2]);
		}
	} else if( mod[0] == "render" ) {
		render() togmod1_domodule(mod[1]);
	} else if( mod[0] == "minkowski" ) {
		minkowski() {
			togmod1_domodule(mod[1]);
			togmod1_domodule(mod[2]);
		}
	} else if( mod[0] == "x-debug" ) {
		# togmod1_domodule(mod[1]);
	} else {
		assert(false, str("Unrecognized shape: ", mod[0]));
	}
}
// main file
// Schonk4.0
// 
// A gridbeam-like beam with hollow chunks.

chunk_pitch = 20;
length_chunks = 3;
floor_hole_diameter =  4;
front_hole_diameter =  4;
back_hole_diameter  = 12;
wall_thickness = 2;
alternate_lateral_hole_direction = true;
$fn = 24;

use <../lib/TOGMod1.scad>
use <../lib/TOGPolyhedronLib1.scad>

function schonk4_make_schonk(
	length_chunks,
	chunk_pitch = 20,
	floor_hole_diameter =  5,
	front_hole_diameter =  4,
	back_hole_diameter  = 12,
	wall_thickness      =  3,
	alternate_lateral_hole_direction = true
) =
let( floor_hole = tphl1_make_z_cylinder(zrange=[-chunk_pitch, chunk_pitch], d=floor_hole_diameter) )
let( front_to_back_hole = ["rotate", [-90,0,0], tphl1_make_z_cylinder(zds=[
	[-chunk_pitch  , front_hole_diameter],
	[-chunk_pitch/2, front_hole_diameter],
	[ chunk_pitch/2,  back_hole_diameter],
	[ chunk_pitch  ,  back_hole_diameter]
])])
let( xy_r = min(3,chunk_pitch/4) )
let( wt = wall_thickness )
let( inner_xy_r = max(1, xy_r-wt) )
let( box_cutout = ["translate", [0,0,chunk_pitch/2], tphl1_make_rounded_cuboid([chunk_pitch-wt*2, chunk_pitch-wt*2, chunk_pitch*2-wt*2], r=[inner_xy_r, inner_xy_r, 0])] )
let( chunk_cutout = ["union",
	floor_hole,
	front_to_back_hole,
	box_cutout
] )
["difference",
	tphl1_make_rounded_cuboid([length_chunks,1,1] * chunk_pitch, r=[xy_r, xy_r, 0]),
	
	for( cx=[-length_chunks/2+0.5:1:length_chunks/2] ) ["translate", [cx*chunk_pitch,0,0],
		["rotate", [0,0,(alternate_lateral_hole_direction?180:0)*floor(cx)], chunk_cutout]],
];

togmod1_domodule(schonk4_make_schonk(
	length_chunks = length_chunks,
	chunk_pitch = chunk_pitch,
	floor_hole_diameter = floor_hole_diameter,
	front_hole_diameter = front_hole_diameter,
	 back_hole_diameter =  back_hole_diameter,
	wall_thickness = wall_thickness,
	alternate_lateral_hole_direction = alternate_lateral_hole_direction
));
